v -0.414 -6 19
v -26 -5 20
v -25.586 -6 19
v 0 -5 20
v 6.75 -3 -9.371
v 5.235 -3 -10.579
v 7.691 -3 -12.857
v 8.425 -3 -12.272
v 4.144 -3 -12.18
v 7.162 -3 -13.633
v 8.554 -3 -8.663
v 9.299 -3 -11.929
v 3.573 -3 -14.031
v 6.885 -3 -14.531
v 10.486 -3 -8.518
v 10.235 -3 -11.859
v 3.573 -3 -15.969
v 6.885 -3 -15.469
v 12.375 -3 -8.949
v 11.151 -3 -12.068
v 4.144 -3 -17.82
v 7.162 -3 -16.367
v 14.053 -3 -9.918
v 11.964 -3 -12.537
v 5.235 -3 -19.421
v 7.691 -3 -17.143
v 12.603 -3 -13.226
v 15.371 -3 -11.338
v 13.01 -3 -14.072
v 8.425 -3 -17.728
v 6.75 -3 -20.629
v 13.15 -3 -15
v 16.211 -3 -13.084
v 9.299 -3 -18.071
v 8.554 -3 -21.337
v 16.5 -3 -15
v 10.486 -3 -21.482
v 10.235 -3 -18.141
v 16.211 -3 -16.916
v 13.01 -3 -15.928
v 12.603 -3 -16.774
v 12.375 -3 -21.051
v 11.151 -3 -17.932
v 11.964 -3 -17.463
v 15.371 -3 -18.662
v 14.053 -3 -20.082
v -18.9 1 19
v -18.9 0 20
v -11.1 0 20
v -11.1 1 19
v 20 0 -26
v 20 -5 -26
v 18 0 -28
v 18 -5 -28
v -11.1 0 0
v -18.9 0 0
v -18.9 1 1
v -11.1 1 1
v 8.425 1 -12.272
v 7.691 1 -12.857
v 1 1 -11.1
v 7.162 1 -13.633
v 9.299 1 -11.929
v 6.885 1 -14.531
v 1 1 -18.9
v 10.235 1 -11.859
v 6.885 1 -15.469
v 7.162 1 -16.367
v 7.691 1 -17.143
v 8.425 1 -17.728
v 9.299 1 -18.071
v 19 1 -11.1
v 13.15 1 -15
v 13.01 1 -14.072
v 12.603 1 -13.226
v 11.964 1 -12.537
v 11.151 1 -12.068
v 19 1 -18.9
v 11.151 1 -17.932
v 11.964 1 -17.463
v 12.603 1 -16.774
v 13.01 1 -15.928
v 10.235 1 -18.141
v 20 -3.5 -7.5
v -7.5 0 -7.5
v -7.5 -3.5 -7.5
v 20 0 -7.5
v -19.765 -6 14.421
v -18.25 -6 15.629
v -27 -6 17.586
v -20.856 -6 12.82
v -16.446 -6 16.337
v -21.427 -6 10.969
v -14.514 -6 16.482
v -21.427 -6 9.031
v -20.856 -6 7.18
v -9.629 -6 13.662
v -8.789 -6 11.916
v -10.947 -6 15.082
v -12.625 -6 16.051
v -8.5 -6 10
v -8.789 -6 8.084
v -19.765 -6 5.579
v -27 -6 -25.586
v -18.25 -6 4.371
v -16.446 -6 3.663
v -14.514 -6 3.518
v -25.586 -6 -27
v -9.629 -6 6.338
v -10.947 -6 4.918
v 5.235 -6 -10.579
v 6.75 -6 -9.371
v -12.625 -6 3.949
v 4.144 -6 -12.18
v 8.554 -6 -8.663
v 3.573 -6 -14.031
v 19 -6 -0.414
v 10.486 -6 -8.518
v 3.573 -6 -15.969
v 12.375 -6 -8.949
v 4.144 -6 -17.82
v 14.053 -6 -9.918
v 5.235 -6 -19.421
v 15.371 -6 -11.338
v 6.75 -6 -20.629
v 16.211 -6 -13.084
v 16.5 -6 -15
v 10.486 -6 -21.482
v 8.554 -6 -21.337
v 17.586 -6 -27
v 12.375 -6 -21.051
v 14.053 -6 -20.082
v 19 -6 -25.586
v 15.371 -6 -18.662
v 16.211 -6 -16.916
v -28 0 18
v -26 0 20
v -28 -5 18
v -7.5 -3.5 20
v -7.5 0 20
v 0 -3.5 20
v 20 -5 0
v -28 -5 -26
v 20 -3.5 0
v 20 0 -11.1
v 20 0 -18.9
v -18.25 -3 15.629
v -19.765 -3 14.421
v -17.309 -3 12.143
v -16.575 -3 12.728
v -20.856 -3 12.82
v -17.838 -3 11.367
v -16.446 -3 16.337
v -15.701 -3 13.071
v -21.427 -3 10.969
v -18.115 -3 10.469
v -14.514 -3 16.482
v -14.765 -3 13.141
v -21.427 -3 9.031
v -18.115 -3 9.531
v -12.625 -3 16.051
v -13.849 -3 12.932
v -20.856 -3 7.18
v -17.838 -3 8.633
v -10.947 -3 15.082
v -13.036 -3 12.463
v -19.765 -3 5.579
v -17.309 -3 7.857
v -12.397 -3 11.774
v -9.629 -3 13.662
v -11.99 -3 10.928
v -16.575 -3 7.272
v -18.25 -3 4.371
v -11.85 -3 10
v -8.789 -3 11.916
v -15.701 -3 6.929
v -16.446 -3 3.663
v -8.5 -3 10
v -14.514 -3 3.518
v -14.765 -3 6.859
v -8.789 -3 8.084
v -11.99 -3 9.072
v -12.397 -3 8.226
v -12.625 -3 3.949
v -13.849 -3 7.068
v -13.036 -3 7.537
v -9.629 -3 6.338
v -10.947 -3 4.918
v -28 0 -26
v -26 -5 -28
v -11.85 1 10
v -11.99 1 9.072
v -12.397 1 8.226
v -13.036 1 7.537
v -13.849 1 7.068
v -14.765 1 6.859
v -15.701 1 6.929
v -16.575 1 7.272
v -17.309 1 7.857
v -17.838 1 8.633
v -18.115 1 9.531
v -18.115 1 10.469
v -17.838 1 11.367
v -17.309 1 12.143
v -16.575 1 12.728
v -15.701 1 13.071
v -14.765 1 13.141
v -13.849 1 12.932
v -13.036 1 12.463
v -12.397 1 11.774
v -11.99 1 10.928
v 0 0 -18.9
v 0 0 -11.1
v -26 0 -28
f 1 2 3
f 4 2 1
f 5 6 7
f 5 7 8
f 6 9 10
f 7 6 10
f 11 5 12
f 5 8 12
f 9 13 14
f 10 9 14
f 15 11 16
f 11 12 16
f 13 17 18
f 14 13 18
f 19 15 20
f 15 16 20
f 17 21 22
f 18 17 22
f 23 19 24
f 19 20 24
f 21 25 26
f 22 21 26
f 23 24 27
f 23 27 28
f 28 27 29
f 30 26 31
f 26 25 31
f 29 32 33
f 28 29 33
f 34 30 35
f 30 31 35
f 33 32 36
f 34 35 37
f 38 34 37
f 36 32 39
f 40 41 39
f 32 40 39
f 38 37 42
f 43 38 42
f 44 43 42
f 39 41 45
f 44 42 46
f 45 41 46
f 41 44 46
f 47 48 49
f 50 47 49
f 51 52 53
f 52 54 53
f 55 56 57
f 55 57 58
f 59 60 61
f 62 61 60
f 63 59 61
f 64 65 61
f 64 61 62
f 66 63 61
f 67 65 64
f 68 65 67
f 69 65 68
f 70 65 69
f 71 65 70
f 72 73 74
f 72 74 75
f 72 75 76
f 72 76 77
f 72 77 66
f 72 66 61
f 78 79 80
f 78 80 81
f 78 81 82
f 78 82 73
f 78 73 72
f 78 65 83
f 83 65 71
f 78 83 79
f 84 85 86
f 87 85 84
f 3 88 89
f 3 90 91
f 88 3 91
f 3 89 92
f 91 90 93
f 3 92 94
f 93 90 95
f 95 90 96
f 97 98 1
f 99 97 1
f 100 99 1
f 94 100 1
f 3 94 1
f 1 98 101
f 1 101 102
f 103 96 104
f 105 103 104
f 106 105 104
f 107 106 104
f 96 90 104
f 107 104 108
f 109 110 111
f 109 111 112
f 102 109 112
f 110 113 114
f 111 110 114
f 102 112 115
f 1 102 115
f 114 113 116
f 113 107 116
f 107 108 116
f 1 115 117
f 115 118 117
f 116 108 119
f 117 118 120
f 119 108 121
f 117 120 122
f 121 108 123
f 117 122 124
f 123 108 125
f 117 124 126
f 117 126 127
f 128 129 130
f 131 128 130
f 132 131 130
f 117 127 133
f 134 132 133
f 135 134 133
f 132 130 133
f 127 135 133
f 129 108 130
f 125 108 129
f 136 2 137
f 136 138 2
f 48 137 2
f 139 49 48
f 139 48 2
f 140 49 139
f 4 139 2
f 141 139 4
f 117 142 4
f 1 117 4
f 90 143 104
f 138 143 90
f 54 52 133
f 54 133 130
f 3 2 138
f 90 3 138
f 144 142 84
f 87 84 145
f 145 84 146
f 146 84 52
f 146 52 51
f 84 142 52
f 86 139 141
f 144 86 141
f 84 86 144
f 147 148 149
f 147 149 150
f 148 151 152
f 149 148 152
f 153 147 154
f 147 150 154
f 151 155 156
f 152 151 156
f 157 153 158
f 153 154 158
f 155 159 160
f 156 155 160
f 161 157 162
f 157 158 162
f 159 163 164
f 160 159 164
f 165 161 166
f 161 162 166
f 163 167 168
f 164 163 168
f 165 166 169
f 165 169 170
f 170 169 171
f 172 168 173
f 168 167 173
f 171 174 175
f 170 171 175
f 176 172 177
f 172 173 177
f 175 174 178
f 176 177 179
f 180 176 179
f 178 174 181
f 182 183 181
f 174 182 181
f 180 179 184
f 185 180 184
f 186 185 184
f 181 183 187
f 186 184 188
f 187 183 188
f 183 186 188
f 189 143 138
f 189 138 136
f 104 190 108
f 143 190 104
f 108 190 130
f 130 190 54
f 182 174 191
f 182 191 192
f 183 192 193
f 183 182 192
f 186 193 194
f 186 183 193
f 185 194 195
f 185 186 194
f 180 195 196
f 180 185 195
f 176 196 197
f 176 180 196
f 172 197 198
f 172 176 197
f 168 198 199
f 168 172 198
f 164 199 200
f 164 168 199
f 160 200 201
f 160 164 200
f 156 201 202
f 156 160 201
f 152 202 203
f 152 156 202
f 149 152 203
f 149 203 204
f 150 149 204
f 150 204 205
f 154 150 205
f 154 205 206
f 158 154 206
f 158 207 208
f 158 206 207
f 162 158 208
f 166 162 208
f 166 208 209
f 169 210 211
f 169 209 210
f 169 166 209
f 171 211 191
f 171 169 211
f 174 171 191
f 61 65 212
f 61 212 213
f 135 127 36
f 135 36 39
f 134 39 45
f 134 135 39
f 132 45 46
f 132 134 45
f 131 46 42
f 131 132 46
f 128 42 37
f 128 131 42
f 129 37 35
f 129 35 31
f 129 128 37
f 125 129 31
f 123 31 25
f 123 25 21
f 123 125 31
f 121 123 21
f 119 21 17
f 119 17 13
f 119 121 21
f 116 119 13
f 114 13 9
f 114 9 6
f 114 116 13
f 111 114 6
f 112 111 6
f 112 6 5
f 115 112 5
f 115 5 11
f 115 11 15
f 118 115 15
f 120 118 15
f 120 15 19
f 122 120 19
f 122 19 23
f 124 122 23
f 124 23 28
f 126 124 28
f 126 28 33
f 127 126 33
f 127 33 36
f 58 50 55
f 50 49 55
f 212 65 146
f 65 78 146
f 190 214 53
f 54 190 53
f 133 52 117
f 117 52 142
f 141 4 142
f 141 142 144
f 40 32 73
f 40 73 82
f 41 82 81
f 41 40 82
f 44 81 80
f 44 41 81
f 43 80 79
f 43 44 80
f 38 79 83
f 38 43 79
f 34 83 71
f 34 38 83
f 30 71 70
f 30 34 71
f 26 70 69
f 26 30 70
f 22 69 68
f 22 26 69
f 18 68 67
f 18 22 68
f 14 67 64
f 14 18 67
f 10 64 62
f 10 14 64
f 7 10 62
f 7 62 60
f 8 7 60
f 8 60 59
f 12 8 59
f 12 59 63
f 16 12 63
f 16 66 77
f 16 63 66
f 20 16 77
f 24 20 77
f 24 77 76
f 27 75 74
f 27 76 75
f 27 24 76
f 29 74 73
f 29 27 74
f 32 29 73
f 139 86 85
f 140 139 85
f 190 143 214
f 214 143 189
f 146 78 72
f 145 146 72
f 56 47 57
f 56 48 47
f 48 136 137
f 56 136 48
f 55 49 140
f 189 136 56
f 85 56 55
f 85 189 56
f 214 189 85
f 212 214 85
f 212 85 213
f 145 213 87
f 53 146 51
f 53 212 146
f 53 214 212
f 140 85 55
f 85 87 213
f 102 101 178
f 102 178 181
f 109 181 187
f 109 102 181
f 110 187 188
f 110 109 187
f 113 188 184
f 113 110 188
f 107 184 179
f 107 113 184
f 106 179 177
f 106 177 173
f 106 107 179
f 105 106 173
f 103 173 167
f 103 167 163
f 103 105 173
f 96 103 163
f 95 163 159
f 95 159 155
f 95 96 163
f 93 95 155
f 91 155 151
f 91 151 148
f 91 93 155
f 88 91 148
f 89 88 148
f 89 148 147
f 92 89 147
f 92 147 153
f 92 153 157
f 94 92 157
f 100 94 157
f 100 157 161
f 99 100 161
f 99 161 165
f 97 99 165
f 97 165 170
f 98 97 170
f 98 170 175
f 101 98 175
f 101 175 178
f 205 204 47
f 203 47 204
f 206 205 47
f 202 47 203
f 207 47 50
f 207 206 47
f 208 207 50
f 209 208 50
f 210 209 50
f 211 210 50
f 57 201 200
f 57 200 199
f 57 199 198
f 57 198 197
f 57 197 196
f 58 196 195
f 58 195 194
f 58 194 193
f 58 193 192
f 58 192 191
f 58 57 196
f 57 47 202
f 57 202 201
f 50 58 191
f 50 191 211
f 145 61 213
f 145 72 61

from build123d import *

# Parameters (mm, degrees)
BOX003_W          = 28
BOX003_H          = 16
BOX003_DEPTH      = 28
CYLINDER002_R     = 6.5
CYLINDER002_DEPTH = 10
CYLINDER003_R     = 6.5
CYLINDER003_DEPTH = 10
CYLINDER001_R     = 3.15
CYLINDER001_DEPTH = 10
CYLINDER_R        = 3.15
CYLINDER_DEPTH    = 10
BOX001_W          = 7.8
BOX001_H          = 2
BOX001_DEPTH      = 20
CHAMFER003_SIZE   = 1
BOX002_W          = 20
BOX002_H          = 2
BOX002_DEPTH      = 7.8
CHAMFER004_SIZE   = 1
BOX_W             = 48
BOX_H             = 6
BOX_DEPTH         = 48
CHAMFER_SIZE      = 20
CHAMFER001_SIZE   = 2
CHAMFER002_SIZE   = 1


with BuildPart() as cube003:
    # Box003 → Box003 (new body)
    with BuildSketch(Plane(origin=(-7.5, -3.5, -7.5), x_dir=(1, 0, 0), z_dir=(0, 0, 1))):
        with Locations((14, 8)):
            Rectangle(BOX003_W, BOX003_H)
    extrude(amount=BOX003_DEPTH)


with BuildPart() as cylinder002:
    # Cylinder002 → Cylinder002 (new body)
    with BuildSketch(Plane(origin=(10, -16, -15), x_dir=(1, 0, 0), z_dir=(0, 1, 0))):
        Circle(CYLINDER002_R)
    extrude(amount=CYLINDER002_DEPTH)


with BuildPart() as fusion003:
    # Cylinder003 → Cylinder003 (new body)
    with BuildSketch(Plane(origin=(-15, -16, 10), x_dir=(1, 0, 0), z_dir=(0, 1, 0))):
        Circle(CYLINDER003_R)
    extrude(amount=CYLINDER003_DEPTH)

    # Fusion003: union Cylinder002
    add(cylinder002.part)


with BuildPart() as fusion003_1:
    # Fusion003 placement: moved
    add(fusion003.part.moved(Location((0, 3, 0))))


with BuildPart() as cylinder001:
    # Cylinder001 → Cylinder001 (new body)
    with BuildSketch(Plane(origin=(10, -7, -15), x_dir=(1, 0, 0), z_dir=(0, 1, 0))):
        Circle(CYLINDER001_R)
    extrude(amount=CYLINDER001_DEPTH)


with BuildPart() as fusion002:
    # Cylinder → Cylinder (new body)
    with BuildSketch(Plane(origin=(-15, -7, 10), x_dir=(1, 0, 0), z_dir=(0, 1, 0))):
        Circle(CYLINDER_R)
    extrude(amount=CYLINDER_DEPTH)

    # Fusion002: union Cylinder001
    add(cylinder001.part)


with BuildPart() as chamfer003:
    # Box001 → Box001 (new body)
    with BuildSketch(Plane(origin=(-18.9, -1, 0), x_dir=(1, 0, 0), z_dir=(0, 0, 1))):
        with Locations((3.9, 1)):
            Rectangle(BOX001_W, BOX001_H)
    extrude(amount=BOX001_DEPTH)

    # Chamfer003
    chamfer003_edges = [chamfer003.edges().sort_by_distance(p)[0] for p in [
        (-15, 1, 0),
        (-15, 1, 20),
    ]]
    chamfer(chamfer003_edges, length=CHAMFER003_SIZE)


with BuildPart() as fusion:
    # Box002 → Box002 (new body)
    with BuildSketch(Plane(origin=(0, -1, -18.9), x_dir=(1, 0, 0), z_dir=(0, 0, 1))):
        with Locations((10, 1)):
            Rectangle(BOX002_W, BOX002_H)
    extrude(amount=BOX002_DEPTH)

    # Chamfer004
    chamfer004_edges = [fusion.edges().sort_by_distance(p)[0] for p in [
        (0, 1, -15),
        (20, 1, -15),
    ]]
    chamfer(chamfer004_edges, length=CHAMFER004_SIZE)

    # Fusion: union Chamfer003
    add(chamfer003.part)


with BuildPart() as side_corner_panel_clip:
    # Box → Box (new body)
    with BuildSketch(Plane(origin=(-28, -6, -28), x_dir=(1, 0, 0), z_dir=(0, 0, 1))):
        with Locations((24, 3)):
            Rectangle(BOX_W, BOX_H)
    extrude(amount=BOX_DEPTH)

    # Chamfer
    chamfer_edges = [side_corner_panel_clip.edges().sort_by_distance(p)[0] for p in [
        (20, -3, 20),
    ]]
    chamfer(chamfer_edges, length=CHAMFER_SIZE)

    # Chamfer001
    chamfer001_edges = [side_corner_panel_clip.edges().sort_by_distance(p)[0] for p in [
        (20, -3, -28),
        (-28, -3, -28),
        (-28, -3, 20),
    ]]
    chamfer(chamfer001_edges, length=CHAMFER001_SIZE)

    # Chamfer002
    chamfer002_edges = [side_corner_panel_clip.edges().sort_by_distance(p)[0] for p in [
        (20, -6, -13),
        (19, -6, -27),
        (10, -6, 10),
        (-4, -6, -28),
        (-13, -6, 20),
        (-27, -6, -27),
        (-27, -6, 19),
        (-28, -6, -4),
    ]]
    chamfer(chamfer002_edges, length=CHAMFER002_SIZE)

    # Fusion001: union Fusion
    add(fusion.part)

    # Cut: cut Fusion002
    add(fusion002.part, mode=Mode.SUBTRACT)

    # Cut001: cut Fusion003
    add(fusion003_1.part, mode=Mode.SUBTRACT)

    # Cut002008006: cut Cube003
    add(cube003.part, mode=Mode.SUBTRACT)


solid = side_corner_panel_clip.part
